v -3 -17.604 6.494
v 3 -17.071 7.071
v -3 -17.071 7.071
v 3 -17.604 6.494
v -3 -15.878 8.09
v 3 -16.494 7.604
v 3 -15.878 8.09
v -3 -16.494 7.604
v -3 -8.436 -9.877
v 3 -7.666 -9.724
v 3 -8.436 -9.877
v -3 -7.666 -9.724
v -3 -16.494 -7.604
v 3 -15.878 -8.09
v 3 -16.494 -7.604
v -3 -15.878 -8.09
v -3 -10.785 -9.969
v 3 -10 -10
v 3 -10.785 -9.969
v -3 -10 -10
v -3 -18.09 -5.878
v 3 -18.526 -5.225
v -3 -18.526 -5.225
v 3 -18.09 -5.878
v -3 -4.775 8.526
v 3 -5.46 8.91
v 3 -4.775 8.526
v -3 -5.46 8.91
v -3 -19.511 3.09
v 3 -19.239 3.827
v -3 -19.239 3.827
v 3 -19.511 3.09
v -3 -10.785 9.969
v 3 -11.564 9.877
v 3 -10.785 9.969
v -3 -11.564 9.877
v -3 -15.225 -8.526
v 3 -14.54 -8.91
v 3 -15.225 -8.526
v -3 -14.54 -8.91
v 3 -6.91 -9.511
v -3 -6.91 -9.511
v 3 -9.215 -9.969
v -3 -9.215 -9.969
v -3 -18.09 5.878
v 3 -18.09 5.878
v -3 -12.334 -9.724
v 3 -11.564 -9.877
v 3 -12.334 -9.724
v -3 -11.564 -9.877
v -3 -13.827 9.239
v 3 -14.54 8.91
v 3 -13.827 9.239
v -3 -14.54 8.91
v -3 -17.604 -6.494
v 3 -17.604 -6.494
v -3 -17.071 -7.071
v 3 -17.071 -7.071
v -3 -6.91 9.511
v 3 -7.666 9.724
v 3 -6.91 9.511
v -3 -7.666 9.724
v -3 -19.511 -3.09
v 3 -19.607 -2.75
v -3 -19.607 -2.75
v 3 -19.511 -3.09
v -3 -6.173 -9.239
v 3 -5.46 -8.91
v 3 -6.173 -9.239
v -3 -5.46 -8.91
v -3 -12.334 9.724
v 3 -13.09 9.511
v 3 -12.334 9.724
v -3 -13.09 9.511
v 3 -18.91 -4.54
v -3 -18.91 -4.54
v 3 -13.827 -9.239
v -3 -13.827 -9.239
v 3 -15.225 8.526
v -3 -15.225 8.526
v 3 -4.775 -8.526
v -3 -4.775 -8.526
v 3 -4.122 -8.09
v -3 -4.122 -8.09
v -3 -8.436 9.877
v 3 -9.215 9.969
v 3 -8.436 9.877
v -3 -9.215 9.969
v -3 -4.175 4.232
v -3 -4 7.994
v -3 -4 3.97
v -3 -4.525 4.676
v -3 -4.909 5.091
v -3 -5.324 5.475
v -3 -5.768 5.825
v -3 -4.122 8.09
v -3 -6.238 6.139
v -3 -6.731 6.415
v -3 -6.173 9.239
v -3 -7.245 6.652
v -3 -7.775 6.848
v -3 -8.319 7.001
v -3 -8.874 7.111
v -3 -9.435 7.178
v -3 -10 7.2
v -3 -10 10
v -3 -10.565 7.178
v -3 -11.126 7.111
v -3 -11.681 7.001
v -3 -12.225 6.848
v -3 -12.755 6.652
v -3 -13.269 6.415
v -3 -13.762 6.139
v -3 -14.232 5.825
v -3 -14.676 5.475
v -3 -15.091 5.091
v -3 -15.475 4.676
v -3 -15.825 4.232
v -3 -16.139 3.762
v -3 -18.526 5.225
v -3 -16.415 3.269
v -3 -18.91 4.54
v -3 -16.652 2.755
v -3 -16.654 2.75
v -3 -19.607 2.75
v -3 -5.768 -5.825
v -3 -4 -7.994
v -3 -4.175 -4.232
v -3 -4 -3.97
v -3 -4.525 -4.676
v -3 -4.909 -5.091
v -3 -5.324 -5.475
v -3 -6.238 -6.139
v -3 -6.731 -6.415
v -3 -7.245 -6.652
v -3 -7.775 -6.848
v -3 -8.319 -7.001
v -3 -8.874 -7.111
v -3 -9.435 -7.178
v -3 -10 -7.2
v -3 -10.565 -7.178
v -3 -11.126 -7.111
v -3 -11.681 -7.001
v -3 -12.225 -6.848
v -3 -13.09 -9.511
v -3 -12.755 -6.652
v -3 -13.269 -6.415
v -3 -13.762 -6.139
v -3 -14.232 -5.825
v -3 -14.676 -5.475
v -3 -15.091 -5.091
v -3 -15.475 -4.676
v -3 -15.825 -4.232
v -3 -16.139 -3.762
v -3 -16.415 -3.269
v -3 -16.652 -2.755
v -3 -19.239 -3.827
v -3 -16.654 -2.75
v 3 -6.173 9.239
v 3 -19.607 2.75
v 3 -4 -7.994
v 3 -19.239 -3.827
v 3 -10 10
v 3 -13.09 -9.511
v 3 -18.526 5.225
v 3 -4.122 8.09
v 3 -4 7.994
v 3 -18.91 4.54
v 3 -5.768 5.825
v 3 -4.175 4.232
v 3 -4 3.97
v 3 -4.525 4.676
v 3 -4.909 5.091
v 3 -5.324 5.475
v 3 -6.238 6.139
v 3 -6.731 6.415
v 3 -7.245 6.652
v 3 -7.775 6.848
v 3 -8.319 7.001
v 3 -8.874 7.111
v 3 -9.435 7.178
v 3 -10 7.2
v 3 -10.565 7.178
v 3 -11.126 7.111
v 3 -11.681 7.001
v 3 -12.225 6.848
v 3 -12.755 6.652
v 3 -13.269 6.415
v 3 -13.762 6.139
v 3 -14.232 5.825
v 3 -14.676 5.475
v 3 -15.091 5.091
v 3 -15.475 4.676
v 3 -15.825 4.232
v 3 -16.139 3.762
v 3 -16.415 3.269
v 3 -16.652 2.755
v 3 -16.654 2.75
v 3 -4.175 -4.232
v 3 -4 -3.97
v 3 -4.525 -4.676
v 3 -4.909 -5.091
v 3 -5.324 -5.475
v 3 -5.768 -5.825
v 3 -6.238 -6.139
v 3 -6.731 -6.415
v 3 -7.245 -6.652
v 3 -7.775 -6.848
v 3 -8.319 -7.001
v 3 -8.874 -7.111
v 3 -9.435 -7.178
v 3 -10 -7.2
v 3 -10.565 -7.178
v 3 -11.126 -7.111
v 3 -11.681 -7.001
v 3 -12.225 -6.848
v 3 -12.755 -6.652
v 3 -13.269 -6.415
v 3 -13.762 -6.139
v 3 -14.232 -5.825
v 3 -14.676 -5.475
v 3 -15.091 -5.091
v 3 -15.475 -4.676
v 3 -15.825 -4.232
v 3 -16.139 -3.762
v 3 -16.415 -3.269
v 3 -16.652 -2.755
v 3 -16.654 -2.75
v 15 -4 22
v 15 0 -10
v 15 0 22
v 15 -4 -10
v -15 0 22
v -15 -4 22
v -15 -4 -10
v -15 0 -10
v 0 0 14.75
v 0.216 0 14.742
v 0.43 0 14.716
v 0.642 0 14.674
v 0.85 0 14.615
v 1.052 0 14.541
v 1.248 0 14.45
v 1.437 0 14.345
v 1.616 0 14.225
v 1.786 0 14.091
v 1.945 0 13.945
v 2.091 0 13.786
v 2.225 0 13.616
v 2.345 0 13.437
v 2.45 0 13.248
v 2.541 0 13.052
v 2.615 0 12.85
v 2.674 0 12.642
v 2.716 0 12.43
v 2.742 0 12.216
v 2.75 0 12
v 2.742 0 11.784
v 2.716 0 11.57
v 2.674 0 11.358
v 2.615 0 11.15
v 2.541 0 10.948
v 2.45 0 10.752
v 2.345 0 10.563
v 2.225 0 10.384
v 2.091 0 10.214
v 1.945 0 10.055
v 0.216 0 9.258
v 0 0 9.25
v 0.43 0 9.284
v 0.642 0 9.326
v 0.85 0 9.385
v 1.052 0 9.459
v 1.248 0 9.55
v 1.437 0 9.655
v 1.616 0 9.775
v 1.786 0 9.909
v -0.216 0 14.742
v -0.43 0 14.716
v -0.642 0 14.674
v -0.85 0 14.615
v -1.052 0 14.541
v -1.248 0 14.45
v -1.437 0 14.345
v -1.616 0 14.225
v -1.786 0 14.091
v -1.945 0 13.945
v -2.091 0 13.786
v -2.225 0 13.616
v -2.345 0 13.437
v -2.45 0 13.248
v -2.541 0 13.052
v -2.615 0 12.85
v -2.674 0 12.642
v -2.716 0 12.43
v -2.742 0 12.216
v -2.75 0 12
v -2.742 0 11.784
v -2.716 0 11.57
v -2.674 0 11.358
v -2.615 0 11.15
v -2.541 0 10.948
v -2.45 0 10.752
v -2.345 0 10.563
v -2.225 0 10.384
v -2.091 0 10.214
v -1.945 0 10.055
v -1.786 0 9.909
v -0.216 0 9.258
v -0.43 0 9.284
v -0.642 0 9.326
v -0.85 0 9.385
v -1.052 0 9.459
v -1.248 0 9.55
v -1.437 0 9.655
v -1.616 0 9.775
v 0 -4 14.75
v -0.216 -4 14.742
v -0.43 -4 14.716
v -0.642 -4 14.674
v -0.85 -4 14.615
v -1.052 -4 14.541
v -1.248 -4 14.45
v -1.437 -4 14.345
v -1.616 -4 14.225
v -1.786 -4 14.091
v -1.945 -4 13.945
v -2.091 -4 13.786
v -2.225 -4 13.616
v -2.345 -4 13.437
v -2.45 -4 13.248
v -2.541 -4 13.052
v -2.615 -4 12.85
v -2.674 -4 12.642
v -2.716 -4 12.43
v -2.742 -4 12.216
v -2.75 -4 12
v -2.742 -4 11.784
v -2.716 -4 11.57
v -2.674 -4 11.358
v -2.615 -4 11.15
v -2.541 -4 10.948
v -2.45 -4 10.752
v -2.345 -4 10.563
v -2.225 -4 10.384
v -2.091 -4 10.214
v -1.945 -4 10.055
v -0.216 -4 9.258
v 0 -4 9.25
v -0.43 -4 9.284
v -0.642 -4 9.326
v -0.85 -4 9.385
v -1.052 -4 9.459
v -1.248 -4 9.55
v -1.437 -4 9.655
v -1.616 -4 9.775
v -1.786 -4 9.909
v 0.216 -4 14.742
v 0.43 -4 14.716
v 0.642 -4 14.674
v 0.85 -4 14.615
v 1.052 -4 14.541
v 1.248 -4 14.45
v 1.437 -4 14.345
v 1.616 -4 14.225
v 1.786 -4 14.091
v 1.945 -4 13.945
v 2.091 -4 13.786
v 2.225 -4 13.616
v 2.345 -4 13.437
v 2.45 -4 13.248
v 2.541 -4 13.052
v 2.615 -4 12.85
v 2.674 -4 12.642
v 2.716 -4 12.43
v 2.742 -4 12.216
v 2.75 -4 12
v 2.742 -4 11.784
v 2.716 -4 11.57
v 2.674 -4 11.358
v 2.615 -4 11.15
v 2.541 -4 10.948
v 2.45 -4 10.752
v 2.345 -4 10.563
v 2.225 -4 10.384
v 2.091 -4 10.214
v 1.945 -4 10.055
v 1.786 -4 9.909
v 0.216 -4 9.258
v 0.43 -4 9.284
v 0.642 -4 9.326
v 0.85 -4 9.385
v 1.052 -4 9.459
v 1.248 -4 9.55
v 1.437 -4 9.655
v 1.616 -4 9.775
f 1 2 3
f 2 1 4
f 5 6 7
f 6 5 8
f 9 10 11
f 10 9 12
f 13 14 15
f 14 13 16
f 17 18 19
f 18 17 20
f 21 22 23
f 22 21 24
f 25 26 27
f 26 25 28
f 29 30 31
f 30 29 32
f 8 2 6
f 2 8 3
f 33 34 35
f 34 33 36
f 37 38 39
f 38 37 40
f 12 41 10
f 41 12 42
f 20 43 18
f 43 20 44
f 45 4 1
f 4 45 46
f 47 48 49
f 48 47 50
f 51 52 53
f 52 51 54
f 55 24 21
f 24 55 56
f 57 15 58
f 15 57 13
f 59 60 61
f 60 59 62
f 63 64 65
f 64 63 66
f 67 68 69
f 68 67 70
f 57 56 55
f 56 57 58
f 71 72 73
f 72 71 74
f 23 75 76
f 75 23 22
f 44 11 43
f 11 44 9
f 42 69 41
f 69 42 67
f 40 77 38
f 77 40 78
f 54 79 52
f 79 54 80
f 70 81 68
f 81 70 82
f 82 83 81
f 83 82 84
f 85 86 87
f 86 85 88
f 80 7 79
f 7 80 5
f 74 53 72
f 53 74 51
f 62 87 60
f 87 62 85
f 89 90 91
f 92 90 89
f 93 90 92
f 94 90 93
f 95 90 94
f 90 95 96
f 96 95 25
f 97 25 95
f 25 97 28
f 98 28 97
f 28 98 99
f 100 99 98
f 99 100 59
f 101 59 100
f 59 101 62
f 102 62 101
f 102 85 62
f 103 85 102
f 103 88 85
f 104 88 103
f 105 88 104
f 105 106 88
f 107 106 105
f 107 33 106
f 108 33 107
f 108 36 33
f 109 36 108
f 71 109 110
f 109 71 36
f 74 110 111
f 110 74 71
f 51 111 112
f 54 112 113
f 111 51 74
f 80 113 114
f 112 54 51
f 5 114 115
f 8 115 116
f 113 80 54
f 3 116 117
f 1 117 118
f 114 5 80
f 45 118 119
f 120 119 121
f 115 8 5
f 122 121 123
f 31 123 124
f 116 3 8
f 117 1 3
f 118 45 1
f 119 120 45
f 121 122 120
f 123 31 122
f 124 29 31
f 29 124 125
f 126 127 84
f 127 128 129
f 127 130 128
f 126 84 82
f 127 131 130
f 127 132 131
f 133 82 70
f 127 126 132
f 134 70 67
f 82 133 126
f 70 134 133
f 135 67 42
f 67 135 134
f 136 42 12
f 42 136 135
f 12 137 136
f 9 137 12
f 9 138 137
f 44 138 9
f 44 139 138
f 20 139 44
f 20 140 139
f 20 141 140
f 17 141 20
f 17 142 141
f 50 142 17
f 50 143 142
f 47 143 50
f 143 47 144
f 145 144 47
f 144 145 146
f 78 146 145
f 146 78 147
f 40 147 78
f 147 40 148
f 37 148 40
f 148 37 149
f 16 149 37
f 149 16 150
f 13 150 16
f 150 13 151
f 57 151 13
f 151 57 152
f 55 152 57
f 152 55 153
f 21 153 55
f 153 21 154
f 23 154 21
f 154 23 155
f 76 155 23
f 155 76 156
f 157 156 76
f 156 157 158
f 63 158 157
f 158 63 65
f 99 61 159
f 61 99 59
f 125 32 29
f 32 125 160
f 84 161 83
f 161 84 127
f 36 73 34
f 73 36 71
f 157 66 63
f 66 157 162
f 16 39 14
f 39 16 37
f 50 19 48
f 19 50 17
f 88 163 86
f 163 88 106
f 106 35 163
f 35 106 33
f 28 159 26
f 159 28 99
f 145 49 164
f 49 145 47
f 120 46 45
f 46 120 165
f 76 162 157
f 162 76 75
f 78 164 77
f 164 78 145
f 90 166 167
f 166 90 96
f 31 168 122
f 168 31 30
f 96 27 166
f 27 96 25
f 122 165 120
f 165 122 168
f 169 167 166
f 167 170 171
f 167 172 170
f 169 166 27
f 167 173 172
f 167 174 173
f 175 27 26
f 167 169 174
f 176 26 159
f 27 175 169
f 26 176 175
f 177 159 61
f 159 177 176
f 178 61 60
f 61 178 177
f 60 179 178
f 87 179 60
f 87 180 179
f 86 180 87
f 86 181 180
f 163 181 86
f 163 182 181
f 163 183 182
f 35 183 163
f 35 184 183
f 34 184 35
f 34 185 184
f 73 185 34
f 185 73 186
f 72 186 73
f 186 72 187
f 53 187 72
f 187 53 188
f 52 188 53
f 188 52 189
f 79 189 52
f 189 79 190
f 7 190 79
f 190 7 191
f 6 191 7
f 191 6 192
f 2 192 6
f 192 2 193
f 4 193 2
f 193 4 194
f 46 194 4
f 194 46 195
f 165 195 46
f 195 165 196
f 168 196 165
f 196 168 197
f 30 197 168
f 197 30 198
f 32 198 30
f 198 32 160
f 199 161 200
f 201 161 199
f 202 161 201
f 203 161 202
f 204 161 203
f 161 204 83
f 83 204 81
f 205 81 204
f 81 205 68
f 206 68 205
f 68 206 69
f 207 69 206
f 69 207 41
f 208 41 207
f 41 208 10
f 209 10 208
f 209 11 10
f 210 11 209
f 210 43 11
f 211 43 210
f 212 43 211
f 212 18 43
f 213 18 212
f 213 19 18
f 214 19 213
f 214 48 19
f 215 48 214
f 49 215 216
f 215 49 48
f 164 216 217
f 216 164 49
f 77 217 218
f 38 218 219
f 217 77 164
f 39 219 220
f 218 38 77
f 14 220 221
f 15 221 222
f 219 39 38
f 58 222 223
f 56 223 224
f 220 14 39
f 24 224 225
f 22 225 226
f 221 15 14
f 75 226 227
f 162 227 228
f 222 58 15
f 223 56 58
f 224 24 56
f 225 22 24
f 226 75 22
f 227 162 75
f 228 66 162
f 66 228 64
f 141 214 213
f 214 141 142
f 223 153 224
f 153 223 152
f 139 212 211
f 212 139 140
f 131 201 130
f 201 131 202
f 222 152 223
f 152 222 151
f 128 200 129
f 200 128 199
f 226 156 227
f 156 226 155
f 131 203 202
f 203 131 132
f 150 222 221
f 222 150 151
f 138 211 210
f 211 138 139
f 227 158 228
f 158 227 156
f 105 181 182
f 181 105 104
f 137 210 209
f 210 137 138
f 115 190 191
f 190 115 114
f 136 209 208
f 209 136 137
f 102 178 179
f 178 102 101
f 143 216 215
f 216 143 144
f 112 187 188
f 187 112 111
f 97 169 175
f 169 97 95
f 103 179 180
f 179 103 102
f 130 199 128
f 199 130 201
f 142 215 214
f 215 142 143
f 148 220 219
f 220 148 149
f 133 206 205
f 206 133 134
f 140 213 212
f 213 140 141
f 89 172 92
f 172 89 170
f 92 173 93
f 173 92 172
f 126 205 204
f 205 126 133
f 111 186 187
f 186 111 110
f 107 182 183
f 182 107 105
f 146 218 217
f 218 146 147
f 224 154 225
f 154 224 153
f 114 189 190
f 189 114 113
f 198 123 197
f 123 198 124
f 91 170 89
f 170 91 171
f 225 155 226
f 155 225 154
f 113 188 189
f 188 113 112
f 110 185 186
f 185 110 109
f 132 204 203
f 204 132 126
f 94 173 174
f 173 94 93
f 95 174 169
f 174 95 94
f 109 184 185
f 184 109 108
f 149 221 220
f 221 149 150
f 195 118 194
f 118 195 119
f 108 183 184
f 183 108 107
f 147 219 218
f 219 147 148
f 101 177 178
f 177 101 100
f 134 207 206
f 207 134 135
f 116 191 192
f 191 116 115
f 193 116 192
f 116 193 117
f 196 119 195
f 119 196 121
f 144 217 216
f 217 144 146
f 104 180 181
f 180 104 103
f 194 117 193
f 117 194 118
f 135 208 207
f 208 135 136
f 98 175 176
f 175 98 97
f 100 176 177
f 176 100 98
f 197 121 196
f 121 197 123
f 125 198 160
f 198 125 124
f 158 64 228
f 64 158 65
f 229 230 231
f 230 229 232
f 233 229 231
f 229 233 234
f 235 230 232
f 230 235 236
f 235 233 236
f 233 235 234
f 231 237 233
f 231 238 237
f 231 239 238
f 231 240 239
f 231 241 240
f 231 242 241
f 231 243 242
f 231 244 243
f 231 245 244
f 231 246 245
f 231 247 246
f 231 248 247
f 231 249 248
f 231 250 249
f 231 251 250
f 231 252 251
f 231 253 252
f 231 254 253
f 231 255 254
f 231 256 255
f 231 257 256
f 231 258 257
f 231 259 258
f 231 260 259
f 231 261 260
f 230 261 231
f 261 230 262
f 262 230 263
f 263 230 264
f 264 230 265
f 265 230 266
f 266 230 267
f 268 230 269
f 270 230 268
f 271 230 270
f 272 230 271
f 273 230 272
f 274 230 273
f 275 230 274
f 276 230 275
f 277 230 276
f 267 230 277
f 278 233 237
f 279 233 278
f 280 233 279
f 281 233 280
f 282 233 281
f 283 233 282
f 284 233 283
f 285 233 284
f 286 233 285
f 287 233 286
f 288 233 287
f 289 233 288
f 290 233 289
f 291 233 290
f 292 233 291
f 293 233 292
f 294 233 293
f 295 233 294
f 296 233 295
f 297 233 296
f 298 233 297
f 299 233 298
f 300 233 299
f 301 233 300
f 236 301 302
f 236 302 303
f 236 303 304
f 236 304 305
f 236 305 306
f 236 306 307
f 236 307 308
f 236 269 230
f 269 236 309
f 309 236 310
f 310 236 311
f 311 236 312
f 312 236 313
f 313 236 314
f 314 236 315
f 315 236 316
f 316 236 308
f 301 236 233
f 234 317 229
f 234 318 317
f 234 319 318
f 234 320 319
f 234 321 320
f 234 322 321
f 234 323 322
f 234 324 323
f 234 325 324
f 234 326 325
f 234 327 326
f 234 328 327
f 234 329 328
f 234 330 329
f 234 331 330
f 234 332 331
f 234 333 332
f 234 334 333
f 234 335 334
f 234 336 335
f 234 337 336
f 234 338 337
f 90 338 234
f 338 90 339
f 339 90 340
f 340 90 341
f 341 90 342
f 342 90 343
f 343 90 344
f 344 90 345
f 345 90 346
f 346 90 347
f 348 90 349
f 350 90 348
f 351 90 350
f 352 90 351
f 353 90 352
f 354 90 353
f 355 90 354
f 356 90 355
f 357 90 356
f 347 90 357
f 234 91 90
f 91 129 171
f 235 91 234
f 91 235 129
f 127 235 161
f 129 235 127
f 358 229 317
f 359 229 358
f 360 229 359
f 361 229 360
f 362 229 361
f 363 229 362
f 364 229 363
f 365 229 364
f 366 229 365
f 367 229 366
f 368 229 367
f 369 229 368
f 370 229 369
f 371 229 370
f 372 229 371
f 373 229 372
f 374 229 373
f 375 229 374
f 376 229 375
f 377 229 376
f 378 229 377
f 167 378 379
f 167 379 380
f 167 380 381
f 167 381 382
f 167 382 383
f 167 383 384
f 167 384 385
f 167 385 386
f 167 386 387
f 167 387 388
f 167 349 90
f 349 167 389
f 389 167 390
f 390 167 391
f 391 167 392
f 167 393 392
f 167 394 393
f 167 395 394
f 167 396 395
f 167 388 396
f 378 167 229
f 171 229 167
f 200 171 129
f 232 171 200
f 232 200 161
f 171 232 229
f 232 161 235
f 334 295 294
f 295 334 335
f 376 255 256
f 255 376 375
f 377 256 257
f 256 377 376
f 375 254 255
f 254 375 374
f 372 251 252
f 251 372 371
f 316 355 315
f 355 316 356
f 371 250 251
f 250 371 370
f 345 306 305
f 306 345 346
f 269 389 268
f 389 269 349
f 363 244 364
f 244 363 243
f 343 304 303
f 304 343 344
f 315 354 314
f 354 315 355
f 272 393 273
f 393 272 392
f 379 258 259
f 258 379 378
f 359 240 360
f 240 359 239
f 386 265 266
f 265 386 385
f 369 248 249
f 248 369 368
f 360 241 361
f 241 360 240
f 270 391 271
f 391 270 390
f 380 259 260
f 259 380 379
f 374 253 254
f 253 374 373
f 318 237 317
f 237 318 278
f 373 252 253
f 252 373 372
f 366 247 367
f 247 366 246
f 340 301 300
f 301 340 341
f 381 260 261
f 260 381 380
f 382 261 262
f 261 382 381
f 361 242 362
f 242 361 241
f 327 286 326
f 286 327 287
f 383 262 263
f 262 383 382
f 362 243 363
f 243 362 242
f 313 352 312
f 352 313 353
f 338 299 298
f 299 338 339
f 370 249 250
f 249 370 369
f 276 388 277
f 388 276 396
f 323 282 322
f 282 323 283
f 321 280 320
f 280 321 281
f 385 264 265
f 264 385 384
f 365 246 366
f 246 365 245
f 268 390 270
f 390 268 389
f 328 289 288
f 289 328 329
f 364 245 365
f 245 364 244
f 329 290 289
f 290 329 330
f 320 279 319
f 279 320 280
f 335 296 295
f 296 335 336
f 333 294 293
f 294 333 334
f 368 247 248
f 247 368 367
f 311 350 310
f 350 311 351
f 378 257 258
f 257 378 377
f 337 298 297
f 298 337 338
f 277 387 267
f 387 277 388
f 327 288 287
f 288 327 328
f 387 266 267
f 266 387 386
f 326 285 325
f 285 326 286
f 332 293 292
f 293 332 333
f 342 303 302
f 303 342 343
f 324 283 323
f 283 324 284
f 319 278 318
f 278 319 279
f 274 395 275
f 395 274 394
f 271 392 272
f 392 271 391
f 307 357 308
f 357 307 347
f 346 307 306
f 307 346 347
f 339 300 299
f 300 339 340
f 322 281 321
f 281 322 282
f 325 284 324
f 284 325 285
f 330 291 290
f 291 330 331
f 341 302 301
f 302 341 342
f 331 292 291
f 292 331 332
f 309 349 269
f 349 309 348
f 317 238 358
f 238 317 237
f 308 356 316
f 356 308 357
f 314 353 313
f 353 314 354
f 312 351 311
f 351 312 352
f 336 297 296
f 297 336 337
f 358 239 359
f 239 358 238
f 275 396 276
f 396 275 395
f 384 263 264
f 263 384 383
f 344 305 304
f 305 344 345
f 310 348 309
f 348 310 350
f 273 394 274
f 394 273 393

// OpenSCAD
// AymanBuilds Modular Filming Station — screw-on cable clip for 2020 extrusion
// The cable runs parallel to the extrusion. Print in PETG for a little flex.
$fn = 80;

clip_thickness = 6;    // along cable/extrusion direction
outer_r = 10;
inner_r = 7.2;         // suitable for approx. 8 mm cable; adjust if needed
entry_gap = 5.5;
base_x = 30;
base_z = 32;
base_t = 4;
screw_d = 5.5;         // M5 clearance

module clip_ring() {
  difference() {
    translate([0,-outer_r,0])
      rotate([0,90,0]) cylinder(r=outer_r, h=clip_thickness, center=true);
    translate([0,-outer_r,0])
      rotate([0,90,0]) cylinder(r=inner_r, h=clip_thickness+1, center=true);
    // Open the C-ring on the outward-facing side (negative Y)
    translate([-clip_thickness/2-1, -2*outer_r-1, -entry_gap/2])
      cube([clip_thickness+2, outer_r+1, entry_gap]);
  }
}

difference() {
  union() {
    // Flat backplate rests against the side face of the extrusion (Y=0)
    translate([-base_x/2,-base_t, -10]) cube([base_x,base_t,base_z]);
    clip_ring();
  }
  // M5 screw enters from the outside through the backplate into a side-slot T-nut
  translate([0,-base_t/2,12]) rotate([90,0,0])
    cylinder(d=screw_d, h=base_t+1, center=true);
}
